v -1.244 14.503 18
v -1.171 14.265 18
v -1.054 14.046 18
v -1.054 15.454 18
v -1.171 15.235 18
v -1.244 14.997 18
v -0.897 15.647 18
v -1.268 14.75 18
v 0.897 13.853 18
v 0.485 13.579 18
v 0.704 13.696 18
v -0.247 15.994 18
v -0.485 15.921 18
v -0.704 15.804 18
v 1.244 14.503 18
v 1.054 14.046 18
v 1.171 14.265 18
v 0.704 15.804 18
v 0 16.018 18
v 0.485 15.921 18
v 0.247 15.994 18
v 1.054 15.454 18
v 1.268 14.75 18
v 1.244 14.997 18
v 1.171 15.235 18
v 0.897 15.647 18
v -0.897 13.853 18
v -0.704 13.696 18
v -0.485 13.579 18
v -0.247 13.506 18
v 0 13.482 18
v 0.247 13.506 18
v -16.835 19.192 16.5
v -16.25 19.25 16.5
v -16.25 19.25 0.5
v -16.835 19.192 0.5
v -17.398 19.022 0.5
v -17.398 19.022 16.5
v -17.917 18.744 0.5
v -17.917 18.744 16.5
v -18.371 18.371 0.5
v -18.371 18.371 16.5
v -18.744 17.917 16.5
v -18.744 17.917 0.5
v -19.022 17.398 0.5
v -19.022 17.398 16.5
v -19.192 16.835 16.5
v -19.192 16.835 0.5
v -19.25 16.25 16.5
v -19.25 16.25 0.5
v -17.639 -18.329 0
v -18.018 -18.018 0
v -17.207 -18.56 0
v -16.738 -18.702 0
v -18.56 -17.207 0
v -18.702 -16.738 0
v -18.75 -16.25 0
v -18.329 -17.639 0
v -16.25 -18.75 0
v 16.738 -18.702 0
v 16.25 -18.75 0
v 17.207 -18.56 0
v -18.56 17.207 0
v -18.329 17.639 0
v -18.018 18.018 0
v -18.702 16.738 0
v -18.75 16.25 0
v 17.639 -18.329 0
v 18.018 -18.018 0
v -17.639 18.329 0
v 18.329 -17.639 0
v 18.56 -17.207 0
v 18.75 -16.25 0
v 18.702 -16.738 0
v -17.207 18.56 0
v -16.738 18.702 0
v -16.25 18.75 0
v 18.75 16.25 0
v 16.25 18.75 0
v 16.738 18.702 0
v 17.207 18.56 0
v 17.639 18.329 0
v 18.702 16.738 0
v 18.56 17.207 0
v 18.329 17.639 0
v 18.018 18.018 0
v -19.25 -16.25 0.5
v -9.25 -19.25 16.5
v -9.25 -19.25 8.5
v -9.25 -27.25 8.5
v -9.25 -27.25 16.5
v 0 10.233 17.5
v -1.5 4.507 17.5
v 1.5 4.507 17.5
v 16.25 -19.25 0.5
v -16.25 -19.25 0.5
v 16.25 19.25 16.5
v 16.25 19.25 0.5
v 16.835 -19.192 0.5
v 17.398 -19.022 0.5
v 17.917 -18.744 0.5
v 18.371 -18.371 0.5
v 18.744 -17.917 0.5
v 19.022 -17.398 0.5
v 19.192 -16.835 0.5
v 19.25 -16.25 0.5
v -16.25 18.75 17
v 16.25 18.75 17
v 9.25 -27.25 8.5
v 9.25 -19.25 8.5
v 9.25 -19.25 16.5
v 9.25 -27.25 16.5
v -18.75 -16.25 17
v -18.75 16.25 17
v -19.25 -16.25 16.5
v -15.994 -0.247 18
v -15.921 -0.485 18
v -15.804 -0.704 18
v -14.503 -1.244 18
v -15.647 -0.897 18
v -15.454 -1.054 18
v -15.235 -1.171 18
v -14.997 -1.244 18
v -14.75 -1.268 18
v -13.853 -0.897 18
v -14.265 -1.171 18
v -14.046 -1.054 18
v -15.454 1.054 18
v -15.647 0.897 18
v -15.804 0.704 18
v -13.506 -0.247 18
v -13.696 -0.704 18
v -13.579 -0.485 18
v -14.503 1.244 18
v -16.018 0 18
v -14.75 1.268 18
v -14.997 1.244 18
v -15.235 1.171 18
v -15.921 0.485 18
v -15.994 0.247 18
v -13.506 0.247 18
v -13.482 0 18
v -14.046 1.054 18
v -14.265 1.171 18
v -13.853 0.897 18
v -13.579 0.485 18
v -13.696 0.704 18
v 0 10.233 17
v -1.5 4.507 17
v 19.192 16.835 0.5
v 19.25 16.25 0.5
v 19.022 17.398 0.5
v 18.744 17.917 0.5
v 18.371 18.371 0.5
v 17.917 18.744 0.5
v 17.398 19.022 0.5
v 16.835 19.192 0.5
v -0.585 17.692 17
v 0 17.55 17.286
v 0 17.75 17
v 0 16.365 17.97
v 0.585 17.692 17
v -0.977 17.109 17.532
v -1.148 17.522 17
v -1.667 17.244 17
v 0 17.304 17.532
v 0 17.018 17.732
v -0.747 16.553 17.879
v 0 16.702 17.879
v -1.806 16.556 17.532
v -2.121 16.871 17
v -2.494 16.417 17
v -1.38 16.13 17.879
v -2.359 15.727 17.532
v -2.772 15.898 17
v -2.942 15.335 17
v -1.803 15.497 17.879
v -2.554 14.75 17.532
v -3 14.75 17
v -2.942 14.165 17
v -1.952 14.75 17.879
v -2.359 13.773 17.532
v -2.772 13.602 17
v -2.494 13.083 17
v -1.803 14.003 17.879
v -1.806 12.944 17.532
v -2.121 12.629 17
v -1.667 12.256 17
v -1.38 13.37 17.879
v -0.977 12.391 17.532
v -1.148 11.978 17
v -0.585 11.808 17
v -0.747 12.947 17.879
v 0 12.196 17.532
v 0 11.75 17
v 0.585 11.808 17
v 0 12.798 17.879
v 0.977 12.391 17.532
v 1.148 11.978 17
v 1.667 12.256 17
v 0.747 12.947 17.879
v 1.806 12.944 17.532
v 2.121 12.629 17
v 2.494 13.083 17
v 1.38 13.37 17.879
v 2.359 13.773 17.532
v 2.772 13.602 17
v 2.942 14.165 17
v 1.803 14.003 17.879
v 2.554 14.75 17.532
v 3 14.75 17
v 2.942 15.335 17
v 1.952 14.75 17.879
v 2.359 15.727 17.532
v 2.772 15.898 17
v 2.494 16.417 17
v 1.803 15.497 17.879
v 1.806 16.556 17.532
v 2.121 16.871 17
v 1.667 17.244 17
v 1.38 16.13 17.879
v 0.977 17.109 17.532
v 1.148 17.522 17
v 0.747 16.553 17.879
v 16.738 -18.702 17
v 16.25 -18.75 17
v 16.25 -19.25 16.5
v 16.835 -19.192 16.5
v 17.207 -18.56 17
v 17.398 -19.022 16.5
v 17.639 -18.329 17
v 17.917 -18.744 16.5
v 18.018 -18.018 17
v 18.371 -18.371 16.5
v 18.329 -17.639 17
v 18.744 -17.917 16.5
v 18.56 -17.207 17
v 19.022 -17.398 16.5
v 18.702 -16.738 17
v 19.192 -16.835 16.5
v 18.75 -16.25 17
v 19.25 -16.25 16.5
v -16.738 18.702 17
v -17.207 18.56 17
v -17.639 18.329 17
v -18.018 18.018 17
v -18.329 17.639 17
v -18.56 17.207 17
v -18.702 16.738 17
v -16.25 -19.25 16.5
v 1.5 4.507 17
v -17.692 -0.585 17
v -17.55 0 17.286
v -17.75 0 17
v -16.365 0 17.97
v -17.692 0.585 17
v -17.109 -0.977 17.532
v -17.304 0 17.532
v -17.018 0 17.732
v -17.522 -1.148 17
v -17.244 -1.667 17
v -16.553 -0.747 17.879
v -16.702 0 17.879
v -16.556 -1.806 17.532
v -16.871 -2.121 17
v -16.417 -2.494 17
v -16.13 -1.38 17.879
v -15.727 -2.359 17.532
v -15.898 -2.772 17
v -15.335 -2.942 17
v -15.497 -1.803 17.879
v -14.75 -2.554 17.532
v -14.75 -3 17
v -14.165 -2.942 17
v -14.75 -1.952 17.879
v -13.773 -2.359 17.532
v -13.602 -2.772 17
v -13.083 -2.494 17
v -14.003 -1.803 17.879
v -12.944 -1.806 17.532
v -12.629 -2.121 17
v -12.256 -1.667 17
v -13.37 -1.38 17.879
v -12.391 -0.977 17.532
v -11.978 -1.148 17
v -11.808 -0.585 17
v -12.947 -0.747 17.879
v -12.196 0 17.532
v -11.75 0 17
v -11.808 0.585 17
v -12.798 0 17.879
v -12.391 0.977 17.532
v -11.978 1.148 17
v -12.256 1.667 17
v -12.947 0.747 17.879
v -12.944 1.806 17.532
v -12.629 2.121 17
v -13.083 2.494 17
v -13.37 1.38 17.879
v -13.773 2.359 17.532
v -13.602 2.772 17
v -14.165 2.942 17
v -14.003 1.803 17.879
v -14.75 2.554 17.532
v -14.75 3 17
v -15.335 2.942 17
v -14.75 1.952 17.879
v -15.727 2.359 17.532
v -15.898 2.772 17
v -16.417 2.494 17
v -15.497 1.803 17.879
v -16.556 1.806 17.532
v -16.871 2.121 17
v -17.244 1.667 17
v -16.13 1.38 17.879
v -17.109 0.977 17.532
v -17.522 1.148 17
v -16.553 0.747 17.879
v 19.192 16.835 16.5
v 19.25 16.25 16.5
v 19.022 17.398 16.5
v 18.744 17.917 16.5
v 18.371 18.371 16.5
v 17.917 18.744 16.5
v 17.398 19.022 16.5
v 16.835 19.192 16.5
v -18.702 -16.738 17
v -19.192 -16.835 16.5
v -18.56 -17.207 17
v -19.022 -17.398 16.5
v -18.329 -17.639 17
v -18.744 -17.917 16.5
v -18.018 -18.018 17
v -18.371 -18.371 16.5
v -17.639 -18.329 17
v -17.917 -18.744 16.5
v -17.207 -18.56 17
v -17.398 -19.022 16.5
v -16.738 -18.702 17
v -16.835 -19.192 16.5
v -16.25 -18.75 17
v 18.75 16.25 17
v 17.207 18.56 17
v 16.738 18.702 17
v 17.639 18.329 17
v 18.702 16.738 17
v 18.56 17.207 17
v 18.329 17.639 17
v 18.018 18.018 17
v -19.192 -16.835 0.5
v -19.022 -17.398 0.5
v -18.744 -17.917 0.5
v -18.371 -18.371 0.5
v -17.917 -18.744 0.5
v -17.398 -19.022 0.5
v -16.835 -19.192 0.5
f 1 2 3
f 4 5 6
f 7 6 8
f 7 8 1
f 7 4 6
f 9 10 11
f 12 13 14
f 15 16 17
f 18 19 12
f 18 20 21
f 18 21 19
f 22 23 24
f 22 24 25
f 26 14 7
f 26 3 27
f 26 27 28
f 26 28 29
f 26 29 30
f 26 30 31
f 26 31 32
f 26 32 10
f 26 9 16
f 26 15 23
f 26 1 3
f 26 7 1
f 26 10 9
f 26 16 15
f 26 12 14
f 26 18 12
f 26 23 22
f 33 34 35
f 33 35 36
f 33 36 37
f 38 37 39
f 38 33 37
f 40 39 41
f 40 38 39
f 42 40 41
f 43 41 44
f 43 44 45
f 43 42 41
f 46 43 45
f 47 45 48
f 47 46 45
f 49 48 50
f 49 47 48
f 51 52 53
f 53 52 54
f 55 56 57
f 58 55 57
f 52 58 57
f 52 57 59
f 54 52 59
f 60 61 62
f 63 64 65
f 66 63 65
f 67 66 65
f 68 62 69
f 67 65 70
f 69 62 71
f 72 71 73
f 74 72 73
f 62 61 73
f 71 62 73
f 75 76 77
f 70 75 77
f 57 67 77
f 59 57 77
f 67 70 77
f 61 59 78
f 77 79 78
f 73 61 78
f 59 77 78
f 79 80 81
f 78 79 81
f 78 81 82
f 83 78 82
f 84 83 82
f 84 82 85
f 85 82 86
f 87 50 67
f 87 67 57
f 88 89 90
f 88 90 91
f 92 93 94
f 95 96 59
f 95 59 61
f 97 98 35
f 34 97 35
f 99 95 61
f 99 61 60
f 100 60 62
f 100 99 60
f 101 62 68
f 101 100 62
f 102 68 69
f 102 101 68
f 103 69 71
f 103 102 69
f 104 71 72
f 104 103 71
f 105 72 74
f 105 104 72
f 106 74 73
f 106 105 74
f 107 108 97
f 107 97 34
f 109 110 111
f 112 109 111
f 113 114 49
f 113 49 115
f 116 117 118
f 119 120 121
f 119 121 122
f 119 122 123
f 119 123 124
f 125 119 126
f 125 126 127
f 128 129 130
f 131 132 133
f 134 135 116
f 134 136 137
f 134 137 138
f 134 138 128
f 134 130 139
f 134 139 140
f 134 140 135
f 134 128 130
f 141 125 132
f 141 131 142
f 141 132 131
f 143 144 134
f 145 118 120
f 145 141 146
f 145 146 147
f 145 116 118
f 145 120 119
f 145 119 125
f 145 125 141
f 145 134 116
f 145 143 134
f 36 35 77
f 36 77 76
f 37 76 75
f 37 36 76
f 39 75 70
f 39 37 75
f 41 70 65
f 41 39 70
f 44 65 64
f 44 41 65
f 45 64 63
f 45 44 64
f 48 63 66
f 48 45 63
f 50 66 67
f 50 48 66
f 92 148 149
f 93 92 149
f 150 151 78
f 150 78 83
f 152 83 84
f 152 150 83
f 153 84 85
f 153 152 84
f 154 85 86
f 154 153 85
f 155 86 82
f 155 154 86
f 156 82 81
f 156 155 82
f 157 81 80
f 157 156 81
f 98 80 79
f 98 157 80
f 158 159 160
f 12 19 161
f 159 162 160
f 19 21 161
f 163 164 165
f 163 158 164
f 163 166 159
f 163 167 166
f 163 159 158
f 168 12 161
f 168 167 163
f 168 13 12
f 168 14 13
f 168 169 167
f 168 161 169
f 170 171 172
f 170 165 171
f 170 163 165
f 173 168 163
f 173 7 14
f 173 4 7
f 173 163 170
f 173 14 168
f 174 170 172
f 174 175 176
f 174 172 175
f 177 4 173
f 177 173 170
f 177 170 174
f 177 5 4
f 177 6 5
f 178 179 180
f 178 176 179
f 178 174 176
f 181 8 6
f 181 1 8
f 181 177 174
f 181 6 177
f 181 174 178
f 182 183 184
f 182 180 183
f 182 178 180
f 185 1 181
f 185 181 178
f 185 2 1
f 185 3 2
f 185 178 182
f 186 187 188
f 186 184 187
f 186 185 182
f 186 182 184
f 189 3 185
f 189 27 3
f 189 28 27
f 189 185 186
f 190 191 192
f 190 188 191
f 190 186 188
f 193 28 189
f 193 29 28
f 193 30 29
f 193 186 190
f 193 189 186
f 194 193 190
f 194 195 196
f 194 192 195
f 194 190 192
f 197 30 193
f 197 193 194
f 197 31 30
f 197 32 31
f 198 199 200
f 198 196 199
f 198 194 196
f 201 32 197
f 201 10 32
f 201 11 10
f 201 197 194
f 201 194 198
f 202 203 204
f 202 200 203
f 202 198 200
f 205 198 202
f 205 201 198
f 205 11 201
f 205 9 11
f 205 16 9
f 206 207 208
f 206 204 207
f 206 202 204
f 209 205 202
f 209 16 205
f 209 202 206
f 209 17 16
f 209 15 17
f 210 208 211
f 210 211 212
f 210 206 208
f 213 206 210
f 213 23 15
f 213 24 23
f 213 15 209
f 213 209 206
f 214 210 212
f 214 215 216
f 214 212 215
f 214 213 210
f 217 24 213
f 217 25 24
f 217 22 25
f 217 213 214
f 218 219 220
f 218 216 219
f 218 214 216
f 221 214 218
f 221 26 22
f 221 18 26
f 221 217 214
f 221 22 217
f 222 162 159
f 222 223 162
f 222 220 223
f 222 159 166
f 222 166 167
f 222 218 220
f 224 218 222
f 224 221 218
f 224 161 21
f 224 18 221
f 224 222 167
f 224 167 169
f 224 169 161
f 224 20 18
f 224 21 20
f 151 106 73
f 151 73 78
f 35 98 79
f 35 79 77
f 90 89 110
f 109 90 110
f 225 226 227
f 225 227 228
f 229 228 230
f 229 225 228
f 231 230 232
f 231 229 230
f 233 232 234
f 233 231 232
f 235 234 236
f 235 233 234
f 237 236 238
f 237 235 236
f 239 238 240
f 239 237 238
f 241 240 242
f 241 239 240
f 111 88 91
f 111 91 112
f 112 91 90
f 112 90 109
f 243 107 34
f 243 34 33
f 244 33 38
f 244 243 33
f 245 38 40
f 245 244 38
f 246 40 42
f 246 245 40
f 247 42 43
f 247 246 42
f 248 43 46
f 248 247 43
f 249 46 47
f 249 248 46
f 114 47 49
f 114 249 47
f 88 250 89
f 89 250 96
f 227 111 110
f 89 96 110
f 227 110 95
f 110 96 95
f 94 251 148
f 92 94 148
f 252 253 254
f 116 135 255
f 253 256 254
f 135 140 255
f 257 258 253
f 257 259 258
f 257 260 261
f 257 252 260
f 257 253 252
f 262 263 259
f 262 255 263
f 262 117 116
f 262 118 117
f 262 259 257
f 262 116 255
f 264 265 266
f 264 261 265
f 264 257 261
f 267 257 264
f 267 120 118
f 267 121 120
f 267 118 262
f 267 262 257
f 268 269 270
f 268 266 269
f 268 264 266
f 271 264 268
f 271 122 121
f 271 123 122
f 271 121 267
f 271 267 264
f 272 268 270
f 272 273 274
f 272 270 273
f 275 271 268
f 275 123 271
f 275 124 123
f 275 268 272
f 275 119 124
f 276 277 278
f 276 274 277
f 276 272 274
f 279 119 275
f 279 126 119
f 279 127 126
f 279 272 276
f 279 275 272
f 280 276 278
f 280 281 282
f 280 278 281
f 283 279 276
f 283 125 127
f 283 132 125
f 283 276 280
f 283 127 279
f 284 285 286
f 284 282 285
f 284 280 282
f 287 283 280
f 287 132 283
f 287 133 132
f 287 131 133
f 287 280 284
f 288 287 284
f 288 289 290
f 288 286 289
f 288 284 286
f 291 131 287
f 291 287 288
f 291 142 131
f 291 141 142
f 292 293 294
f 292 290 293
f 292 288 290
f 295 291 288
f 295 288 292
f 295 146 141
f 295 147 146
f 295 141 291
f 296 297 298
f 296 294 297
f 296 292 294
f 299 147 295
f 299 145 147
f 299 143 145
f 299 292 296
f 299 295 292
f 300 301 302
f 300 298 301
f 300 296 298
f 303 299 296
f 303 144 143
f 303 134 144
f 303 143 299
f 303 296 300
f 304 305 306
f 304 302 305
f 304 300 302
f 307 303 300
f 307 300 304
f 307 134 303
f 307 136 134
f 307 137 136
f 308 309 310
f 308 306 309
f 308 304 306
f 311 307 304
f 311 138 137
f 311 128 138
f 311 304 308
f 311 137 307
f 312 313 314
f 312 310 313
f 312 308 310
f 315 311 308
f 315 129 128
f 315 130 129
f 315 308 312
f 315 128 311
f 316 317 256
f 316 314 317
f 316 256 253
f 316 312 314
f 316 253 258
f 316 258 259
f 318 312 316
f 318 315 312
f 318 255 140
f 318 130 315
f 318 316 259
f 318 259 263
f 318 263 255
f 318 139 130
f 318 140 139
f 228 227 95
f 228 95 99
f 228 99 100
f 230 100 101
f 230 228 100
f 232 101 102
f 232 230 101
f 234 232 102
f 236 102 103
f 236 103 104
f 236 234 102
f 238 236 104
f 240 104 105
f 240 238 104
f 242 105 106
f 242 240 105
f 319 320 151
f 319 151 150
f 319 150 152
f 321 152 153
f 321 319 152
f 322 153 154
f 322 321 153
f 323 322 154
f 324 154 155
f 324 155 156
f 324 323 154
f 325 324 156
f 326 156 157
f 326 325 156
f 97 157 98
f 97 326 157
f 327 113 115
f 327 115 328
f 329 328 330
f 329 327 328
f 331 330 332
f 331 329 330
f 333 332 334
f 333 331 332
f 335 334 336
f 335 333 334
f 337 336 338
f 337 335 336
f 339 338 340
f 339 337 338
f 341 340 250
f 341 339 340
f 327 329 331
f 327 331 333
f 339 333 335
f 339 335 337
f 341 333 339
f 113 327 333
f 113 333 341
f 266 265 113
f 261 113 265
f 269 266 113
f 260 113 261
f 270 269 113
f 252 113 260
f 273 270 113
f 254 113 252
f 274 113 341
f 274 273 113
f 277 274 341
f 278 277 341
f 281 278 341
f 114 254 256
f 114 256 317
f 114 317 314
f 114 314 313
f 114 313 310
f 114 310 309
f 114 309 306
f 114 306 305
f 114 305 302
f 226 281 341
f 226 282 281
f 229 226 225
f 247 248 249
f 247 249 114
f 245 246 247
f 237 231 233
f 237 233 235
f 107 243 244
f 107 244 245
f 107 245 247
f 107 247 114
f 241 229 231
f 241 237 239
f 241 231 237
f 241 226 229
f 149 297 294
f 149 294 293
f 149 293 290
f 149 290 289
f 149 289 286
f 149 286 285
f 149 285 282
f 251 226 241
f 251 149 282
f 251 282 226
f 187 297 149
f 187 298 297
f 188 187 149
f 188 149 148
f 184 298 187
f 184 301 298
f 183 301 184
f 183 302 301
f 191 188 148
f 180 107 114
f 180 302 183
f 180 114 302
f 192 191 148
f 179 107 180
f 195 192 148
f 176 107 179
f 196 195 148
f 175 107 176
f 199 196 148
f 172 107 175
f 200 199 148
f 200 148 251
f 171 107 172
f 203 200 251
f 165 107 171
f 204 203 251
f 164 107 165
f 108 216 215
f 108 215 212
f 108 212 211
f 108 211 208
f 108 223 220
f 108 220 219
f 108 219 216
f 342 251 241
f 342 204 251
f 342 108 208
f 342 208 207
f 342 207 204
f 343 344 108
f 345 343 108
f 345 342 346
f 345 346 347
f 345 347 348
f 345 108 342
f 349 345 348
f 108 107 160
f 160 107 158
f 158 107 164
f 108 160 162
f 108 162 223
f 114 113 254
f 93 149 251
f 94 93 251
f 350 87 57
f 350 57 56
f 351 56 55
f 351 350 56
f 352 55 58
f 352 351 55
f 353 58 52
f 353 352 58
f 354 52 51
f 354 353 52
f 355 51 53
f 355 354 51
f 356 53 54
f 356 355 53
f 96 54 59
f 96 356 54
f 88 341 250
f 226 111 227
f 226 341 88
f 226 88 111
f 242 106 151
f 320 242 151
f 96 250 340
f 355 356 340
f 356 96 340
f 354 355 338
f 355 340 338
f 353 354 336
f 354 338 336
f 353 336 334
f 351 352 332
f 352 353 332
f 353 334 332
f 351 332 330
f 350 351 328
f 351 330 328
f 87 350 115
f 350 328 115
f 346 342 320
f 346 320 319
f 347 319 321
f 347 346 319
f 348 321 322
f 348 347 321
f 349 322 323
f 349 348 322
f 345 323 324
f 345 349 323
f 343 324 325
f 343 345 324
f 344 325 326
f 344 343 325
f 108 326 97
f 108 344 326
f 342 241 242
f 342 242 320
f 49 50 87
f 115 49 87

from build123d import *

# Parameters (mm, degrees)
F1_DEPTH = 17
F3_DEPTH = 0.5
F4_DEPTH = 18
F6_R     = 3
F7_SIZE  = 0.5
F8_W     = 18.5
F8_H     = 8
F9_DEPTH = 8


# Not quite as in the source:
# - a fillet or chamfer that OpenCascade refuses, or shapes differently, is made with other operations: its cross-section is extruded or revolved along the edge and cut away or added


with BuildPart() as f1:
    # F0 (on Top) → F1 (new body)
    with BuildSketch(Plane.XY):
        Polygon((-19.25, -19.25), (19.25, -19.25), (19.25, 19.25), (0, 19.25), (-19.25, 19.25), (-19.25, 0), align=None)
        with BuildLine():
            ThreePointArc((-11.75, 0), (-14.75, -3), (-17.75, 0))
            ThreePointArc((-17.75, 0), (-14.75, 3), (-11.75, 0))
        make_face(mode=Mode.SUBTRACT)
        with BuildLine():
            ThreePointArc((3, 14.75), (-2.1213203436, 12.6286796564), (0, 17.75))
            ThreePointArc((0, 17.75), (2.1213203436, 16.8713203436), (3, 14.75))
        make_face(mode=Mode.SUBTRACT)
        with BuildLine():
            ThreePointArc((-11.75, 0), (-14.75, 3), (-17.75, 0))
            ThreePointArc((-17.75, 0), (-14.75, -3), (-11.75, 0))
        make_face()
        with BuildLine():
            ThreePointArc((3, 14.75), (2.1213203436, 16.8713203436), (0, 17.75))
            ThreePointArc((0, 17.75), (-2.1213203436, 12.6286796564), (3, 14.75))
        make_face()
    extrude(amount=F1_DEPTH)

    # F2 (on face) → F3 (join)
    with BuildSketch(Plane.XY.offset(17)):
        Polygon((-1.5, 4.5069497171), (1.5, 4.5069497171), (0, 10.2327093482), align=None)
    extrude(amount=F3_DEPTH)

    # F0 (on Top) → F4 (join)
    with BuildSketch(Plane.XY):
        with BuildLine():
            ThreePointArc((3, 14.75), (2.1213203436, 16.8713203436), (0, 17.75))
            ThreePointArc((0, 17.75), (-2.1213203436, 12.6286796564), (3, 14.75))
        make_face()
        with BuildLine():
            ThreePointArc((-11.75, 0), (-14.75, 3), (-17.75, 0))
            ThreePointArc((-17.75, 0), (-14.75, -3), (-11.75, 0))
        make_face()
    extrude(amount=F4_DEPTH)

    # F5: fillet of radius 2 on 2 edges, made by hand

    # F5_s1 → F5_t2 (revolve, cut)
    with BuildSketch(Plane.YZ):
        with BuildLine():
            ThreePointArc((17.75, 17), (17.0179491924, 17.7320508076), (16.0179491924, 18))
            Line((16.0179491924, 18), (17.75, 18))
            Line((17.75, 18), (17.75, 17))
        make_face()
    revolve(axis=Axis((0, 14.75, 18), (0, 0, 1)), mode=Mode.SUBTRACT)

    # F5_s3 → F5_t4 (revolve, cut)
    with BuildSketch(Plane.XZ):
        with BuildLine():
            ThreePointArc((-17.75, 17), (-17.0179491924, 17.7320508076), (-16.0179491924, 18))
            Line((-16.0179491924, 18), (-17.75, 18))
            Line((-17.75, 18), (-17.75, 17))
        make_face()
    revolve(axis=Axis((-14.75, 0, 18), (0, 0, 1)), mode=Mode.SUBTRACT)

    # F6
    f6_edges = [f1.edges().sort_by_distance(p)[0] for p in [
        (19.25, -19.25, 8.5),
        (-19.25, -19.25, 8.5),
        (-19.25, 19.25, 8.5),
        (19.25, 19.25, 8.5),
    ]]
    fillet(f6_edges, radius=F6_R)

    # F7
    f7_edges = [f1.edges().sort_by_distance(p)[0] for p in [
        (0, 19.25, 17),
        (18.37132, 18.37132, 17),
        (19.25, 0, 17),
        (18.37132, -18.37132, 17),
        (0, -19.25, 17),
        (-18.37132, -18.37132, 17),
        (-19.25, 0, 17),
        (-18.37132, 18.37132, 17),
        (0, -19.25, 0),
        (-18.37132, -18.37132, 0),
        (18.37132, -18.37132, 0),
        (-19.25, 0, 0),
        (19.25, 0, 0),
        (-18.37132, 18.37132, 0),
        (18.37132, 18.37132, 0),
        (0, 19.25, 0),
    ]]
    chamfer(f7_edges, length=F7_SIZE)

    # F8 (on face) → F9 (join)
    with BuildSketch(Plane.XZ.offset(19.25)):
        with Locations((0, 12.5)):
            Rectangle(F8_W, F8_H)
    extrude(amount=F9_DEPTH)


solid = f1.part
